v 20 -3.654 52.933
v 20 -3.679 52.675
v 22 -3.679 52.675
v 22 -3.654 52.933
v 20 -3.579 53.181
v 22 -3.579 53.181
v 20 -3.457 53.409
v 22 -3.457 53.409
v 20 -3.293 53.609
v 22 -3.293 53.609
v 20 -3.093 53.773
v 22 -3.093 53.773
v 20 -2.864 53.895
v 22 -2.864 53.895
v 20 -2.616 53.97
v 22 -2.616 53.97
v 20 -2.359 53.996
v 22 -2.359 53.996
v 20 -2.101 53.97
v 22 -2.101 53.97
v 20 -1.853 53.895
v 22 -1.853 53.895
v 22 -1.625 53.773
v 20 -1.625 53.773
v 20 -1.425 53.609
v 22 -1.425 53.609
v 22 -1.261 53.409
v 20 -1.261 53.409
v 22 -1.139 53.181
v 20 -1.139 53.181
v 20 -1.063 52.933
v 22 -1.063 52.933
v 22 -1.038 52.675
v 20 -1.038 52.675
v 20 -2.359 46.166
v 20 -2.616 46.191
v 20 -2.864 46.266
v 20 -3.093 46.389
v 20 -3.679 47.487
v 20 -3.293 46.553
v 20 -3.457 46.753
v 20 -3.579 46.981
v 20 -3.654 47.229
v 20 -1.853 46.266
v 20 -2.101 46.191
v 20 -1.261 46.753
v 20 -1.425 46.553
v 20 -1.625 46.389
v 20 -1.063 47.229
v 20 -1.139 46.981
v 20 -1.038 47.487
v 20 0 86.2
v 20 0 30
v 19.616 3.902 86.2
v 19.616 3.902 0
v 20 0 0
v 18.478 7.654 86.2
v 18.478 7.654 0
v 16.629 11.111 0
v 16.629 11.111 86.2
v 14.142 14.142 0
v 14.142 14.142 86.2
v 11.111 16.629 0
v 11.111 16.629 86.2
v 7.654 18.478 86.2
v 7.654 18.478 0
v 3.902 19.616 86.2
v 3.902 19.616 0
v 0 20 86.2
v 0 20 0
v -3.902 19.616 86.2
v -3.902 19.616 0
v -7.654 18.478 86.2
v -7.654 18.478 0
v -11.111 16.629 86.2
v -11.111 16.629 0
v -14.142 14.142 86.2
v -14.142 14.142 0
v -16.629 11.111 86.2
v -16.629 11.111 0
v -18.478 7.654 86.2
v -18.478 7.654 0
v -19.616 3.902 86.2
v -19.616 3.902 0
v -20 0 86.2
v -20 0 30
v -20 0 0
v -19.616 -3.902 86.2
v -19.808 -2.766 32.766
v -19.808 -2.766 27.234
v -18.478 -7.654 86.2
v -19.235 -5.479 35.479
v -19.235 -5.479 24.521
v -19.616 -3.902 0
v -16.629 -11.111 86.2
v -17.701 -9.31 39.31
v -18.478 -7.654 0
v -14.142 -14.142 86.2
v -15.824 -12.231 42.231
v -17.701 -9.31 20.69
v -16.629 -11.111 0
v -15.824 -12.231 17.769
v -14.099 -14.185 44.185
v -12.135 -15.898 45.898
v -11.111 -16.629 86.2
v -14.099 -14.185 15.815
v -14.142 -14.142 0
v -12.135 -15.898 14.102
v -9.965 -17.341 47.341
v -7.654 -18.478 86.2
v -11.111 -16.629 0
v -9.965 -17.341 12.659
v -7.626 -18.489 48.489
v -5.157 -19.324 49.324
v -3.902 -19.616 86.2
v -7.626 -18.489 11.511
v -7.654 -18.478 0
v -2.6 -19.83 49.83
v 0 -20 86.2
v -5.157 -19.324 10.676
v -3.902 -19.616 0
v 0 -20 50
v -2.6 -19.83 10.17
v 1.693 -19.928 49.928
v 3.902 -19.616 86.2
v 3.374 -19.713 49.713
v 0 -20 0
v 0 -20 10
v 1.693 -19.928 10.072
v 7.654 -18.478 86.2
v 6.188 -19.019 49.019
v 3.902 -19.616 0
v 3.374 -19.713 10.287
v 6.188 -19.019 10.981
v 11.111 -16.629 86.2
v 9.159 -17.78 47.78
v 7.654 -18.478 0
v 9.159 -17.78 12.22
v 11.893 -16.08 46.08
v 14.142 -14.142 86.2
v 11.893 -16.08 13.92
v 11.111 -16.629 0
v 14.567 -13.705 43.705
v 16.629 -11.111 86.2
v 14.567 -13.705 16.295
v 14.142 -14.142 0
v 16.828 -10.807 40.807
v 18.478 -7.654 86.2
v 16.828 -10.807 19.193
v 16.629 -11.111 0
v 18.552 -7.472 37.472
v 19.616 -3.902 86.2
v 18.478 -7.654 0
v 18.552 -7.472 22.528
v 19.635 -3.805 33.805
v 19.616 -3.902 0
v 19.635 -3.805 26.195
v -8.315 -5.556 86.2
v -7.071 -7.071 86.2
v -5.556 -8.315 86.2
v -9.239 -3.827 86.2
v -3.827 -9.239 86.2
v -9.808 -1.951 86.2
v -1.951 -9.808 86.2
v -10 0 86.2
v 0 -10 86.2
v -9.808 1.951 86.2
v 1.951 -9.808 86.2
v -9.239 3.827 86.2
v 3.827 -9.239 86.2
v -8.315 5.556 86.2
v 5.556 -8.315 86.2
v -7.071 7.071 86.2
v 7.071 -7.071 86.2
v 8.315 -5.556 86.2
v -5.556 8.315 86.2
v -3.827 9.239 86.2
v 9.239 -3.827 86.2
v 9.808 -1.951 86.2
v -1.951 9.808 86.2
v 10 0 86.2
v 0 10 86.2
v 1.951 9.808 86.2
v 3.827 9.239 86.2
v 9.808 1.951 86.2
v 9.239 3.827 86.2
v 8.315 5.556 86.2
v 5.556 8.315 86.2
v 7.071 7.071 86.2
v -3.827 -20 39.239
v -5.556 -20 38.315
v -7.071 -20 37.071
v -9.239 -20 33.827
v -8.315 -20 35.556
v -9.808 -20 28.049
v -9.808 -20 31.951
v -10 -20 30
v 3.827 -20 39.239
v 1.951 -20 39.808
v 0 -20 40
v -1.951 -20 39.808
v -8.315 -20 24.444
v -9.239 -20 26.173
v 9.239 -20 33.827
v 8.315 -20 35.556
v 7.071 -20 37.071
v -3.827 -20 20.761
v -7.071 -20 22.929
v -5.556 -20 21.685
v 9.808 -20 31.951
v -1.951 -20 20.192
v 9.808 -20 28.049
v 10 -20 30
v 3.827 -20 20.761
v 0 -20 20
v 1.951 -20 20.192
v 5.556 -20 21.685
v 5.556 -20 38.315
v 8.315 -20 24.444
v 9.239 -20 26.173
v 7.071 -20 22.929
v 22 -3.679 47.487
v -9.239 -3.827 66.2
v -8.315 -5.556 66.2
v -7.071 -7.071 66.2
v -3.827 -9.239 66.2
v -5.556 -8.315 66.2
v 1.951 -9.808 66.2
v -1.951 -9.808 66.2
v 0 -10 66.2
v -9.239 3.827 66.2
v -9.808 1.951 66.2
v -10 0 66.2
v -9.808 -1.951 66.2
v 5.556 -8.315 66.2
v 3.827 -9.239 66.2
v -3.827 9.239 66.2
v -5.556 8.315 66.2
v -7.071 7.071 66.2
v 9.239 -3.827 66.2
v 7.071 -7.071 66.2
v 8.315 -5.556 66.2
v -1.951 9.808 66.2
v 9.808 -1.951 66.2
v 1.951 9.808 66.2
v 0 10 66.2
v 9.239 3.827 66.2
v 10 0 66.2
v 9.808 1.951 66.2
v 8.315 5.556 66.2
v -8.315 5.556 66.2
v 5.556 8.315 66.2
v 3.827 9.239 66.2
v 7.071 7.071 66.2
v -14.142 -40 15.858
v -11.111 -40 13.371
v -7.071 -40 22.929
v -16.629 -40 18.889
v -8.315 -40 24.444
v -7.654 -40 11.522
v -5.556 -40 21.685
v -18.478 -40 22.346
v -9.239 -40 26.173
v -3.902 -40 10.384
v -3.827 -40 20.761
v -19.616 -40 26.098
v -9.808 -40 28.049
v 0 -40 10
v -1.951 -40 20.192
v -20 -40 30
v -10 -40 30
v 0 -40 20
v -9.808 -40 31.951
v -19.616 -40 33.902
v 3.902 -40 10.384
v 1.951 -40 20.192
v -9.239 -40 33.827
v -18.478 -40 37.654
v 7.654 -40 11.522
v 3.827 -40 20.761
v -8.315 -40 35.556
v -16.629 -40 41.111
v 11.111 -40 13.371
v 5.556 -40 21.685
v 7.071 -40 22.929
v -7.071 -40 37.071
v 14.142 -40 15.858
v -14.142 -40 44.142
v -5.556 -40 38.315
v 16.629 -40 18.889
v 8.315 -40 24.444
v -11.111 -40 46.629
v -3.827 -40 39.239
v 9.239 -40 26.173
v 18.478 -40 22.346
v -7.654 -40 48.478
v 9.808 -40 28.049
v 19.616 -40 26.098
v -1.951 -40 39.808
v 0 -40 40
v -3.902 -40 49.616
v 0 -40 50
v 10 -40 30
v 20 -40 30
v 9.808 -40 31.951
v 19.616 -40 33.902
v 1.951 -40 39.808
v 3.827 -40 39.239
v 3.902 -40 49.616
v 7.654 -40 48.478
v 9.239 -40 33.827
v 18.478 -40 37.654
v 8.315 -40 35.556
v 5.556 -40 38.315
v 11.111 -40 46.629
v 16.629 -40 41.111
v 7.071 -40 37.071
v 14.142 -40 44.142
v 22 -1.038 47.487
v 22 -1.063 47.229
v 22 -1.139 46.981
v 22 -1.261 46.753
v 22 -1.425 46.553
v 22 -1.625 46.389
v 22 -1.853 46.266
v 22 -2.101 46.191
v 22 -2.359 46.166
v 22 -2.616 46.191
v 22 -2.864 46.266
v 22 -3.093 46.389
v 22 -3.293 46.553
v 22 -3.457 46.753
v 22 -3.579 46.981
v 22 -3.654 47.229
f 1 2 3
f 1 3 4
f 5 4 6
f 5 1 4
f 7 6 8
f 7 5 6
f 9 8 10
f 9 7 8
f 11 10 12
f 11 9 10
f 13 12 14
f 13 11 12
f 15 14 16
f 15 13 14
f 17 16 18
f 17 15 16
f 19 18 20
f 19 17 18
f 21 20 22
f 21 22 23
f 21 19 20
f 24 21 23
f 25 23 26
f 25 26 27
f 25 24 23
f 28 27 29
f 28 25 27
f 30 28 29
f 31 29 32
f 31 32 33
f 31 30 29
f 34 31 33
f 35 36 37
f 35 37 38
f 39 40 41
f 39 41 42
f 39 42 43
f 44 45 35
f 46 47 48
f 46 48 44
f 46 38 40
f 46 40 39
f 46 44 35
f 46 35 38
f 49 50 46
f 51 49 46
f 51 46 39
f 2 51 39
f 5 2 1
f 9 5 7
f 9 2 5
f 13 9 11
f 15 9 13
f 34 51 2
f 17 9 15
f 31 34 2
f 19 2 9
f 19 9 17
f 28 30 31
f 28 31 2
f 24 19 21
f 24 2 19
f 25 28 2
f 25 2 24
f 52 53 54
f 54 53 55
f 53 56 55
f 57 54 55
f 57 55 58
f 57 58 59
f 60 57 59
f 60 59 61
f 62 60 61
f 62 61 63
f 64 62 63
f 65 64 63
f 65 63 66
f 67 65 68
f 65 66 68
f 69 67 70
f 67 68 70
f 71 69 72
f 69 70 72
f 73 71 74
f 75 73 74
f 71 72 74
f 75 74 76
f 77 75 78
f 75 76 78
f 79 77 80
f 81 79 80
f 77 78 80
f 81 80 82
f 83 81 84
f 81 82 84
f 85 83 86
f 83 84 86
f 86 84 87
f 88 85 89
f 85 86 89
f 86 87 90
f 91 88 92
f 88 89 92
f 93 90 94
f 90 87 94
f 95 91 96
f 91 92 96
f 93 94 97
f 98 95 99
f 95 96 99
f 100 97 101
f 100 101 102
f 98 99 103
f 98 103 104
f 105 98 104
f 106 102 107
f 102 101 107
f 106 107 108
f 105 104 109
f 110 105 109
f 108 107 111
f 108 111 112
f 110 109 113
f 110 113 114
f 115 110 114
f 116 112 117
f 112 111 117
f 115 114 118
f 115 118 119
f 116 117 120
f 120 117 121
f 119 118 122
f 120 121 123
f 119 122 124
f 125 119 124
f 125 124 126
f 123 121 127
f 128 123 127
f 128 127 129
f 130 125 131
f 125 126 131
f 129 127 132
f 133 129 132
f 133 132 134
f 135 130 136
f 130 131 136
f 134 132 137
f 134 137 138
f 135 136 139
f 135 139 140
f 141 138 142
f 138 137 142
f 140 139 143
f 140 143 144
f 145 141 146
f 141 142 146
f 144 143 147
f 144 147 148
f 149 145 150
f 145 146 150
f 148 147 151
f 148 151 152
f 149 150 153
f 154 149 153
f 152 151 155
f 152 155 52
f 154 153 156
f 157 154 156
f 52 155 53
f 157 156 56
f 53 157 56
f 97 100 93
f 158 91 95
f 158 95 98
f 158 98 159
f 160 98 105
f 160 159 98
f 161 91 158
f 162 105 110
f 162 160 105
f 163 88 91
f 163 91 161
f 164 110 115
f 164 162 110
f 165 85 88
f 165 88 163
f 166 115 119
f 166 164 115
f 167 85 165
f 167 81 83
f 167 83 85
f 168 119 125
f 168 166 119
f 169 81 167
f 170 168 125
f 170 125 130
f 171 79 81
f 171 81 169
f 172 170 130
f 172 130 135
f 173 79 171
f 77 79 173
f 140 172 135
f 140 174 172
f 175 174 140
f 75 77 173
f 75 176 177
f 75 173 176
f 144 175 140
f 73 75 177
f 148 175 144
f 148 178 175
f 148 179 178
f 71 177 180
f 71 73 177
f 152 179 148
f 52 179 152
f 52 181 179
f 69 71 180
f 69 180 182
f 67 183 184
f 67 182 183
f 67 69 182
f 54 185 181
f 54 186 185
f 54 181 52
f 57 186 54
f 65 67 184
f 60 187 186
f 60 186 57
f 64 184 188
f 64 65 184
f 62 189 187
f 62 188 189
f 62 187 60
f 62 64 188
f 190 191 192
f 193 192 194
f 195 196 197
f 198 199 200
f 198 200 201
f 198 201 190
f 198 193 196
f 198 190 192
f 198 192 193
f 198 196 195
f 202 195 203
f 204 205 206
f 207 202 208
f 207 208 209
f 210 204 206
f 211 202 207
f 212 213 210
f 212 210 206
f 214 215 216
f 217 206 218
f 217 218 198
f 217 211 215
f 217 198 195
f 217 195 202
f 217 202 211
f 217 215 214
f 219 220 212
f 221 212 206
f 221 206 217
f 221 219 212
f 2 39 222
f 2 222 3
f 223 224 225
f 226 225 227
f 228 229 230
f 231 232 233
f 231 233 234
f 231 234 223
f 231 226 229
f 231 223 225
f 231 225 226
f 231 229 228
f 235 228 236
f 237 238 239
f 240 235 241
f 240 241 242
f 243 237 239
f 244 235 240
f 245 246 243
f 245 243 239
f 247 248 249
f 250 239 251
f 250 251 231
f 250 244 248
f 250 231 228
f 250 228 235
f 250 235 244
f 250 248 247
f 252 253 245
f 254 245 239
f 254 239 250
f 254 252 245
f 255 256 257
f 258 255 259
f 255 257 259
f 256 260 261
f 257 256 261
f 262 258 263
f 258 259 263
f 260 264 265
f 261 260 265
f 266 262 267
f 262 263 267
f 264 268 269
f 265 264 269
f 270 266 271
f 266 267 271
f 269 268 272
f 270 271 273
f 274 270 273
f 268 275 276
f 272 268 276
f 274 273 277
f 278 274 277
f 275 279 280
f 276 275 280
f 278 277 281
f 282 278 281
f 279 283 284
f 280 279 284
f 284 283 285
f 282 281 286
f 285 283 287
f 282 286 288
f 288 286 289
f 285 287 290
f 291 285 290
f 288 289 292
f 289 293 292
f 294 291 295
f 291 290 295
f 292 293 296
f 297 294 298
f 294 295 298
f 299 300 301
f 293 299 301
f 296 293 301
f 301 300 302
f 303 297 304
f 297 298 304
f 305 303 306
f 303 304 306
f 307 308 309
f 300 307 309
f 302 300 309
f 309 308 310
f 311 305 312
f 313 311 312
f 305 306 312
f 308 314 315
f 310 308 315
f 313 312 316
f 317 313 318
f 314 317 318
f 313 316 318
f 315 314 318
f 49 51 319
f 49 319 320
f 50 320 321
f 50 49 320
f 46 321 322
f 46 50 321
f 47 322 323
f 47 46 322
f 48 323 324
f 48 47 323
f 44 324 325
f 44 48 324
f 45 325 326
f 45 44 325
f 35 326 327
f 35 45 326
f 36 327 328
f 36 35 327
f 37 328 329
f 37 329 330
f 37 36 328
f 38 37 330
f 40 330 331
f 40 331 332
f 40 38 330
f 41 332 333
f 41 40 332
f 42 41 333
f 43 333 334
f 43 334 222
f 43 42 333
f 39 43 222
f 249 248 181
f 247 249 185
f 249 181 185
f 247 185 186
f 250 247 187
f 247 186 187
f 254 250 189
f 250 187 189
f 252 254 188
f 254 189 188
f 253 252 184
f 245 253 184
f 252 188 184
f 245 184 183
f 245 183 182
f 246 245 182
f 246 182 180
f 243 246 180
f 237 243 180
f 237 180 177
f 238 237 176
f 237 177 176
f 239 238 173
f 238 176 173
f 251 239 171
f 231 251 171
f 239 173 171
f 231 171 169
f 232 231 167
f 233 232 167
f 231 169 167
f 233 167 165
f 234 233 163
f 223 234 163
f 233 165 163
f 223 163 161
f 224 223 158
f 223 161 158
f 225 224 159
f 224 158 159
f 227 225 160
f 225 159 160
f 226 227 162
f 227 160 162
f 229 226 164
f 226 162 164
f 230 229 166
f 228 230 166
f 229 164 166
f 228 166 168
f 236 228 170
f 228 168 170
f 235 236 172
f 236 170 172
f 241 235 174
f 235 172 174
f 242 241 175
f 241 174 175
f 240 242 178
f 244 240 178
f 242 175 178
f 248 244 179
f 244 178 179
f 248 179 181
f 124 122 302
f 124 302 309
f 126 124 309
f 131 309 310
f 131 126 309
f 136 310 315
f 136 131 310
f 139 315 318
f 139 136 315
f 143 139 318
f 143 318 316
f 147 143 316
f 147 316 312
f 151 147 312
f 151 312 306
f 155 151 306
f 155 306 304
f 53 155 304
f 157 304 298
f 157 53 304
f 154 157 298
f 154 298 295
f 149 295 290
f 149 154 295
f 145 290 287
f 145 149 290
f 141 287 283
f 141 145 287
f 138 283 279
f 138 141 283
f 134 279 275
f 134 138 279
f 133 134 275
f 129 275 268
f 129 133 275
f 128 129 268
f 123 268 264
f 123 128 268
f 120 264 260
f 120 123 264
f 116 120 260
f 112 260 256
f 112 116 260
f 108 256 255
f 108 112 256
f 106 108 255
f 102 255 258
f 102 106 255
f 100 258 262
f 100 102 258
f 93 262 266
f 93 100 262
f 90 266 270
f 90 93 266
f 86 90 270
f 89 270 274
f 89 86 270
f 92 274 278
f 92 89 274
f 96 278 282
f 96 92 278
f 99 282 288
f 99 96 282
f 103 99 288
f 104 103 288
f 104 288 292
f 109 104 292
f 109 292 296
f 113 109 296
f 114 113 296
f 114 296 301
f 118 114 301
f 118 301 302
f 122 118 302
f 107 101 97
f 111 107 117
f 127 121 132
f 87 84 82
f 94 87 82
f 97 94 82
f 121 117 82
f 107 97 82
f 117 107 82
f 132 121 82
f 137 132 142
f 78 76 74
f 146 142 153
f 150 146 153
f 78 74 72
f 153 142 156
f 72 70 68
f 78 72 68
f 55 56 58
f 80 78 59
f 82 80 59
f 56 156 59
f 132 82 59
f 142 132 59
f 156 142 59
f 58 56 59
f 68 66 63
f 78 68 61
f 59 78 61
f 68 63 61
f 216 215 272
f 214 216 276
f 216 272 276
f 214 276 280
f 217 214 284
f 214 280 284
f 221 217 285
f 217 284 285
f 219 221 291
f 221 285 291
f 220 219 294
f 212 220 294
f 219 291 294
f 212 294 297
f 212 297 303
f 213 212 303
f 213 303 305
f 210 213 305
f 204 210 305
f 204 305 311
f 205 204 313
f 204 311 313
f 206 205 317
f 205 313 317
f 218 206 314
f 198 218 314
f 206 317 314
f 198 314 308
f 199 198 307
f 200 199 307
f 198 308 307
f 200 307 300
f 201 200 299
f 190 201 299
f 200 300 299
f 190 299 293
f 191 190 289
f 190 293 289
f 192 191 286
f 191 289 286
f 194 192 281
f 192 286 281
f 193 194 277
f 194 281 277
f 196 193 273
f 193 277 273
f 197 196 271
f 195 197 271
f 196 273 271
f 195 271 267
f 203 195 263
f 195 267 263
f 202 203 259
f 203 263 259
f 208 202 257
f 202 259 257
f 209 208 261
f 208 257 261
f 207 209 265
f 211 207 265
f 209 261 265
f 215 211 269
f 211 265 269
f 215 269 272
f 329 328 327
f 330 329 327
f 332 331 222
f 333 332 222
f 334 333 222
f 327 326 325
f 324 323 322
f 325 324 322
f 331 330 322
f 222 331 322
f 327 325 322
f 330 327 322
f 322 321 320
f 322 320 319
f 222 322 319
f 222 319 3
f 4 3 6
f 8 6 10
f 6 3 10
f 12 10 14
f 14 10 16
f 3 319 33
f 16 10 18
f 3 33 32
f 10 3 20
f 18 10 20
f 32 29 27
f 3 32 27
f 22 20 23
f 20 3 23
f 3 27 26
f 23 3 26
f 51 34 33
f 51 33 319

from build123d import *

# Parameters (mm, degrees)
SKETCH1_R           = 20
BOSS_EXTRUDE1_DEPTH = 86.2
SKETCH4_R           = 20
BOSS_EXTRUDE2_DEPTH = 40
SKETCH5_R           = 10
CUT_EXTRUDE1_DEPTH  = 20
SKETCH6_R           = 10
CUT_EXTRUDE2_DEPTH  = 20
BOSS_EXTRUDE3_DEPTH = 2


with BuildPart() as part:
    # Sketch1 → Boss-Extrude1 (new body)
    with BuildSketch(Plane.XY):
        Circle(SKETCH1_R)
    extrude(amount=BOSS_EXTRUDE1_DEPTH)

    # Sketch4 → Boss-Extrude2 (add)
    with BuildSketch(Plane(origin=(0, 0, 0), x_dir=(1, 0, 0), z_dir=(0, 1, 0))):
        with Locations(Location((0, -30, 0), (0, 0, 270))):
            Circle(SKETCH4_R)
    extrude(amount=-BOSS_EXTRUDE2_DEPTH)

    # Sketch5 → Cut-Extrude1 (cut)
    with BuildSketch(Plane.XZ.offset(40)):
        with Locations(Location((0, 30, 0), (0, 0, 270))):
            Circle(SKETCH5_R)
    extrude(amount=-CUT_EXTRUDE1_DEPTH, mode=Mode.SUBTRACT)

    # Sketch6 → Cut-Extrude2 (cut)
    with BuildSketch(Plane.XY.offset(86.2)):
        Circle(SKETCH6_R)
    extrude(amount=-CUT_EXTRUDE2_DEPTH, mode=Mode.SUBTRACT)


with BuildPart() as body_2:
    # Sketch7 → Boss-Extrude3 (new body)
    with BuildSketch(Plane(origin=(20, 0, 0), x_dir=(0, 0, -1), z_dir=(1, 0, 0))):
        with BuildLine():
            Line((-52.675133912, -1.038052004), (-47.486637704, -1.038052004))
            ThreePointArc((-47.486637704, -1.038052004), (-46.165929578, -2.358760129), (-47.486637704, -3.679468255))
            Line((-47.486637704, -3.679468255), (-52.675133912, -3.679468255))
            ThreePointArc((-52.675133912, -3.679468255), (-53.995842038, -2.358760129), (-52.675133912, -1.038052004))
        make_face()
    extrude(amount=BOSS_EXTRUDE3_DEPTH)


solid = Compound([part.part, body_2.part])
